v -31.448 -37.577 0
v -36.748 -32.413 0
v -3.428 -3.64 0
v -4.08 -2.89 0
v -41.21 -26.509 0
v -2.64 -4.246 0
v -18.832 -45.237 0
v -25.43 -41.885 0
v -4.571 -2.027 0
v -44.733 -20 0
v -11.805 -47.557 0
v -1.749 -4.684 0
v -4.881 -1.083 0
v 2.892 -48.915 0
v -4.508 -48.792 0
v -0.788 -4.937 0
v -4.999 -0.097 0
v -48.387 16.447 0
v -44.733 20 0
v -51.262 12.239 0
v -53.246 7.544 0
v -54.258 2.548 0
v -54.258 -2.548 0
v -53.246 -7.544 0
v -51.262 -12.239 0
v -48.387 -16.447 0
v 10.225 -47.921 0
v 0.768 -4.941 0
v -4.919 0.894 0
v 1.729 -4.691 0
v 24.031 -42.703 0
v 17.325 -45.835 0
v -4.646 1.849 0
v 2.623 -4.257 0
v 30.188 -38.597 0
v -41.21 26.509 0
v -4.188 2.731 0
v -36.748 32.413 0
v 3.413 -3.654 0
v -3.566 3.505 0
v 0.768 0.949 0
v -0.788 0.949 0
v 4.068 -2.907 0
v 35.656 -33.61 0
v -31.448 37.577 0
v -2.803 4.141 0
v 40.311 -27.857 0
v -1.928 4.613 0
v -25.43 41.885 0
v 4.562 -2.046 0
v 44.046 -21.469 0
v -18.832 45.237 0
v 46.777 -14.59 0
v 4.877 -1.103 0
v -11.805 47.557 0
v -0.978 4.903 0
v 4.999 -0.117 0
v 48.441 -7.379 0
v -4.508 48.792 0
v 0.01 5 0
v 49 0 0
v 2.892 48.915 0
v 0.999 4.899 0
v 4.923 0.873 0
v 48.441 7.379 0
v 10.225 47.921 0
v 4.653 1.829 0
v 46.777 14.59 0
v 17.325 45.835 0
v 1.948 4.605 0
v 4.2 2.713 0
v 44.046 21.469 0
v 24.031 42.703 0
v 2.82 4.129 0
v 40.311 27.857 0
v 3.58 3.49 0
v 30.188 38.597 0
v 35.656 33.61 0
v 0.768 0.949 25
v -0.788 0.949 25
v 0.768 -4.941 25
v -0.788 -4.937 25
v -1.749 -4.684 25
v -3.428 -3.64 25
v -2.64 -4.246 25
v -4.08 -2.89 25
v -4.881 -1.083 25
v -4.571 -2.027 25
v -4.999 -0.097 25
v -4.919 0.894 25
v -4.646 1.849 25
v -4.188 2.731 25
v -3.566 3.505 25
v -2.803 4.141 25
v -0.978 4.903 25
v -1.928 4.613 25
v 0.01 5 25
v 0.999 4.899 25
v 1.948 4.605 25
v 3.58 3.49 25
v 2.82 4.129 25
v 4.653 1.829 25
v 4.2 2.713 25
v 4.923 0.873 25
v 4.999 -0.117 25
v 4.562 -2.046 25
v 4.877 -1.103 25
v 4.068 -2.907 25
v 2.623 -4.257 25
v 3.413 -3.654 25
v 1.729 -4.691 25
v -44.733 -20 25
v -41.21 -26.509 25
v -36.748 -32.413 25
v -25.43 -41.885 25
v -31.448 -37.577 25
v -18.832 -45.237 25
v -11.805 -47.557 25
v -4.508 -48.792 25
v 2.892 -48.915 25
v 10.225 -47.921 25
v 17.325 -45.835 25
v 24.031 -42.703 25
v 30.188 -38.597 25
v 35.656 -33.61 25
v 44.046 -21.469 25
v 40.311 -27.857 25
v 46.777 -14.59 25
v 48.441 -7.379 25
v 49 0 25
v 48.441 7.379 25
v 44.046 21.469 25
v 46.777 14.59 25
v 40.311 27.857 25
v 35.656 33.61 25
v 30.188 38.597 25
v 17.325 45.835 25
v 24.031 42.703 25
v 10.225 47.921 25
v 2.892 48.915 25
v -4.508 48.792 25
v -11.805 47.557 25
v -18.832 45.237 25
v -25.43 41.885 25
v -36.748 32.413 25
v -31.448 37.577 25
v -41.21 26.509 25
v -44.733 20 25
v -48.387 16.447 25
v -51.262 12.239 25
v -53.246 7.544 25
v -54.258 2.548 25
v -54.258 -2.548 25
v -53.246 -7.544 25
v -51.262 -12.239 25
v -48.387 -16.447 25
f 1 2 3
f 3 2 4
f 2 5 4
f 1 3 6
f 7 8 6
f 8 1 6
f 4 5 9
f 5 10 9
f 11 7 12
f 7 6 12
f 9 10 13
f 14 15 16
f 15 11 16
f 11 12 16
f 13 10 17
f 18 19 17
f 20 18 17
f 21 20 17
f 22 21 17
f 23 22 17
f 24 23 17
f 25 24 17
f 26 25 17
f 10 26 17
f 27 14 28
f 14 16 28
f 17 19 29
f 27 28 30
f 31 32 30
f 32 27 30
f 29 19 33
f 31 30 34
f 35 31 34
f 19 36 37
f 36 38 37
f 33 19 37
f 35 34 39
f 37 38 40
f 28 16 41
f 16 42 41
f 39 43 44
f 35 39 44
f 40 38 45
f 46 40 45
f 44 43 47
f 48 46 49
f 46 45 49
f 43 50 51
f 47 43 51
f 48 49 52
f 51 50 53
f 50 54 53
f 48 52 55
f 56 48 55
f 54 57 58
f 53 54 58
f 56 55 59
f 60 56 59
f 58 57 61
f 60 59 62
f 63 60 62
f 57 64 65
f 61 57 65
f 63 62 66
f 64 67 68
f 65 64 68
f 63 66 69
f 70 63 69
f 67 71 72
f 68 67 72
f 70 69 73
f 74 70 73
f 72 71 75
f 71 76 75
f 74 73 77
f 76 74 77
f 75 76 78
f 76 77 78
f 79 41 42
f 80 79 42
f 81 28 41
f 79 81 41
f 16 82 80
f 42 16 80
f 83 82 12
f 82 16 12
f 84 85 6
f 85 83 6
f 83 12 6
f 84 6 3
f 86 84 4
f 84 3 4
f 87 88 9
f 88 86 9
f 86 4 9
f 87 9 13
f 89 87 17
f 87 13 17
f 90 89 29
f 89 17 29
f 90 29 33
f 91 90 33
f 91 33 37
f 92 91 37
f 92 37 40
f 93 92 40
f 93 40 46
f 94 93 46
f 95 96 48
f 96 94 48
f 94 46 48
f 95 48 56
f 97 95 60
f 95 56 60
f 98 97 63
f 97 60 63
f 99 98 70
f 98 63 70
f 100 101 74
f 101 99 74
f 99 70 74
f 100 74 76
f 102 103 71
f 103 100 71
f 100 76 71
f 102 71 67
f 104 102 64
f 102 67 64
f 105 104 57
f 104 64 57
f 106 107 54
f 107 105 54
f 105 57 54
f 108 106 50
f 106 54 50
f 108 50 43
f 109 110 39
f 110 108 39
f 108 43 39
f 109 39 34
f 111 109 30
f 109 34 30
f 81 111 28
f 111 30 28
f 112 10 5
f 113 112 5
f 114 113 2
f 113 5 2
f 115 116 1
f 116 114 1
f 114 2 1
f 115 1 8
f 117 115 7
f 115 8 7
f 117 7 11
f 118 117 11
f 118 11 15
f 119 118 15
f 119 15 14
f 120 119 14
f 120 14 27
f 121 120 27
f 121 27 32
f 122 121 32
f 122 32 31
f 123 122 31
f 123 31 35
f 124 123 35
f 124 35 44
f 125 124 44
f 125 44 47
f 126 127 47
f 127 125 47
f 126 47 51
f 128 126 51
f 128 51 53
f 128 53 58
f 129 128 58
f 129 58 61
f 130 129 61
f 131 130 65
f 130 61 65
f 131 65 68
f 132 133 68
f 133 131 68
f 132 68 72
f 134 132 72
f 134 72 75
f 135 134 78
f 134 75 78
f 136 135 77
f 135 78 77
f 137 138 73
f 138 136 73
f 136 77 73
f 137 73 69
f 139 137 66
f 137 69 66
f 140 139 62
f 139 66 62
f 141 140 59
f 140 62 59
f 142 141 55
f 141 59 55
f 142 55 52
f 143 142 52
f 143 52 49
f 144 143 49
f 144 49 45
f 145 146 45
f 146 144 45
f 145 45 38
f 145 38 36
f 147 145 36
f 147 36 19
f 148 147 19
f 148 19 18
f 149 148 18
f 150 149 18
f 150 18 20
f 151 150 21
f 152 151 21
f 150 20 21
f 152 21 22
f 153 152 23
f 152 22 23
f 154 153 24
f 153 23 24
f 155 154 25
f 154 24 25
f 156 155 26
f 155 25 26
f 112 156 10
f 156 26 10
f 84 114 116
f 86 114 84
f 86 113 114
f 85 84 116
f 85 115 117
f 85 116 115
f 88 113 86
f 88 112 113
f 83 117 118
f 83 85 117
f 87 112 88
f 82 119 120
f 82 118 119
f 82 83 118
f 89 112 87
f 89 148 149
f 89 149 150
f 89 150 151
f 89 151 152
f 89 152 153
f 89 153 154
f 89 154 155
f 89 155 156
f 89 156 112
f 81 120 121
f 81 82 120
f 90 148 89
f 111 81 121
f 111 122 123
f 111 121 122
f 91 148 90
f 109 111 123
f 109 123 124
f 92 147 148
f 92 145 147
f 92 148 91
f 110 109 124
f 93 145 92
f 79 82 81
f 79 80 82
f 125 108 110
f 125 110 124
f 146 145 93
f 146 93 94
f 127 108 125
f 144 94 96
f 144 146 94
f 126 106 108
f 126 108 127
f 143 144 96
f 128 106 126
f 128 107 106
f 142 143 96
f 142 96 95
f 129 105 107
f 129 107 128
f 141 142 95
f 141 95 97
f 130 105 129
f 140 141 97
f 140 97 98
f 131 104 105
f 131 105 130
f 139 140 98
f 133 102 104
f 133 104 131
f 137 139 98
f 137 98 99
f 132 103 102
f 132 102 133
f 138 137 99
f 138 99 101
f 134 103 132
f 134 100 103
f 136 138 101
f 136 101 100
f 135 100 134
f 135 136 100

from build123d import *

# Parameters (mm, degrees)
SKETCH_1_R          = 49
EXTRUDE_1_DEPTH     = 25
SKETCH_2_R          = 5
CUT_EXTRUDE_1_DEPTH = 25
SKETCH_3_W          = 1.555795937
SKETCH_3_H          = 6.849823777
EXTRUDE_4_DEPTH     = 25
EXTRUDE_5_DEPTH     = 25


with BuildPart() as part:
    # 草图1 → 凸台-拉伸1 (new body)
    with BuildSketch(Plane.XY):
        Circle(SKETCH_1_R)
    extrude(amount=EXTRUDE_1_DEPTH)

    # 草图2 → 切除-拉伸1 (cut)
    with BuildSketch(Plane(origin=(0, 0, 0), x_dir=(-1, 0, 0), z_dir=(0, 0, -1))):
        Circle(SKETCH_2_R)
    extrude(amount=-CUT_EXTRUDE_1_DEPTH, mode=Mode.SUBTRACT)

    # 草图3 → 凸台-拉伸4 (add)
    with BuildSketch(Plane(origin=(0, 0, 0), x_dir=(-1, 0, 0), z_dir=(0, 0, -1))):
        with Locations((0.010297919, -2.475862613)):
            Rectangle(SKETCH_3_W, SKETCH_3_H)
    extrude(amount=-EXTRUDE_4_DEPTH)

    # 草图7 → 凸台-拉伸5 (add)
    with BuildSketch(Plane(origin=(0, 0, 0), x_dir=(-1, 0, 0), z_dir=(0, 0, -1))):
        with BuildLine():
            ThreePointArc((44.732538493, 20), (54.385039322, 0), (44.732538493, -20))
            ThreePointArc((44.732538493, -20), (49, 0), (44.732538493, 20))
        make_face()
    extrude(amount=-EXTRUDE_5_DEPTH)


solid = part.part
